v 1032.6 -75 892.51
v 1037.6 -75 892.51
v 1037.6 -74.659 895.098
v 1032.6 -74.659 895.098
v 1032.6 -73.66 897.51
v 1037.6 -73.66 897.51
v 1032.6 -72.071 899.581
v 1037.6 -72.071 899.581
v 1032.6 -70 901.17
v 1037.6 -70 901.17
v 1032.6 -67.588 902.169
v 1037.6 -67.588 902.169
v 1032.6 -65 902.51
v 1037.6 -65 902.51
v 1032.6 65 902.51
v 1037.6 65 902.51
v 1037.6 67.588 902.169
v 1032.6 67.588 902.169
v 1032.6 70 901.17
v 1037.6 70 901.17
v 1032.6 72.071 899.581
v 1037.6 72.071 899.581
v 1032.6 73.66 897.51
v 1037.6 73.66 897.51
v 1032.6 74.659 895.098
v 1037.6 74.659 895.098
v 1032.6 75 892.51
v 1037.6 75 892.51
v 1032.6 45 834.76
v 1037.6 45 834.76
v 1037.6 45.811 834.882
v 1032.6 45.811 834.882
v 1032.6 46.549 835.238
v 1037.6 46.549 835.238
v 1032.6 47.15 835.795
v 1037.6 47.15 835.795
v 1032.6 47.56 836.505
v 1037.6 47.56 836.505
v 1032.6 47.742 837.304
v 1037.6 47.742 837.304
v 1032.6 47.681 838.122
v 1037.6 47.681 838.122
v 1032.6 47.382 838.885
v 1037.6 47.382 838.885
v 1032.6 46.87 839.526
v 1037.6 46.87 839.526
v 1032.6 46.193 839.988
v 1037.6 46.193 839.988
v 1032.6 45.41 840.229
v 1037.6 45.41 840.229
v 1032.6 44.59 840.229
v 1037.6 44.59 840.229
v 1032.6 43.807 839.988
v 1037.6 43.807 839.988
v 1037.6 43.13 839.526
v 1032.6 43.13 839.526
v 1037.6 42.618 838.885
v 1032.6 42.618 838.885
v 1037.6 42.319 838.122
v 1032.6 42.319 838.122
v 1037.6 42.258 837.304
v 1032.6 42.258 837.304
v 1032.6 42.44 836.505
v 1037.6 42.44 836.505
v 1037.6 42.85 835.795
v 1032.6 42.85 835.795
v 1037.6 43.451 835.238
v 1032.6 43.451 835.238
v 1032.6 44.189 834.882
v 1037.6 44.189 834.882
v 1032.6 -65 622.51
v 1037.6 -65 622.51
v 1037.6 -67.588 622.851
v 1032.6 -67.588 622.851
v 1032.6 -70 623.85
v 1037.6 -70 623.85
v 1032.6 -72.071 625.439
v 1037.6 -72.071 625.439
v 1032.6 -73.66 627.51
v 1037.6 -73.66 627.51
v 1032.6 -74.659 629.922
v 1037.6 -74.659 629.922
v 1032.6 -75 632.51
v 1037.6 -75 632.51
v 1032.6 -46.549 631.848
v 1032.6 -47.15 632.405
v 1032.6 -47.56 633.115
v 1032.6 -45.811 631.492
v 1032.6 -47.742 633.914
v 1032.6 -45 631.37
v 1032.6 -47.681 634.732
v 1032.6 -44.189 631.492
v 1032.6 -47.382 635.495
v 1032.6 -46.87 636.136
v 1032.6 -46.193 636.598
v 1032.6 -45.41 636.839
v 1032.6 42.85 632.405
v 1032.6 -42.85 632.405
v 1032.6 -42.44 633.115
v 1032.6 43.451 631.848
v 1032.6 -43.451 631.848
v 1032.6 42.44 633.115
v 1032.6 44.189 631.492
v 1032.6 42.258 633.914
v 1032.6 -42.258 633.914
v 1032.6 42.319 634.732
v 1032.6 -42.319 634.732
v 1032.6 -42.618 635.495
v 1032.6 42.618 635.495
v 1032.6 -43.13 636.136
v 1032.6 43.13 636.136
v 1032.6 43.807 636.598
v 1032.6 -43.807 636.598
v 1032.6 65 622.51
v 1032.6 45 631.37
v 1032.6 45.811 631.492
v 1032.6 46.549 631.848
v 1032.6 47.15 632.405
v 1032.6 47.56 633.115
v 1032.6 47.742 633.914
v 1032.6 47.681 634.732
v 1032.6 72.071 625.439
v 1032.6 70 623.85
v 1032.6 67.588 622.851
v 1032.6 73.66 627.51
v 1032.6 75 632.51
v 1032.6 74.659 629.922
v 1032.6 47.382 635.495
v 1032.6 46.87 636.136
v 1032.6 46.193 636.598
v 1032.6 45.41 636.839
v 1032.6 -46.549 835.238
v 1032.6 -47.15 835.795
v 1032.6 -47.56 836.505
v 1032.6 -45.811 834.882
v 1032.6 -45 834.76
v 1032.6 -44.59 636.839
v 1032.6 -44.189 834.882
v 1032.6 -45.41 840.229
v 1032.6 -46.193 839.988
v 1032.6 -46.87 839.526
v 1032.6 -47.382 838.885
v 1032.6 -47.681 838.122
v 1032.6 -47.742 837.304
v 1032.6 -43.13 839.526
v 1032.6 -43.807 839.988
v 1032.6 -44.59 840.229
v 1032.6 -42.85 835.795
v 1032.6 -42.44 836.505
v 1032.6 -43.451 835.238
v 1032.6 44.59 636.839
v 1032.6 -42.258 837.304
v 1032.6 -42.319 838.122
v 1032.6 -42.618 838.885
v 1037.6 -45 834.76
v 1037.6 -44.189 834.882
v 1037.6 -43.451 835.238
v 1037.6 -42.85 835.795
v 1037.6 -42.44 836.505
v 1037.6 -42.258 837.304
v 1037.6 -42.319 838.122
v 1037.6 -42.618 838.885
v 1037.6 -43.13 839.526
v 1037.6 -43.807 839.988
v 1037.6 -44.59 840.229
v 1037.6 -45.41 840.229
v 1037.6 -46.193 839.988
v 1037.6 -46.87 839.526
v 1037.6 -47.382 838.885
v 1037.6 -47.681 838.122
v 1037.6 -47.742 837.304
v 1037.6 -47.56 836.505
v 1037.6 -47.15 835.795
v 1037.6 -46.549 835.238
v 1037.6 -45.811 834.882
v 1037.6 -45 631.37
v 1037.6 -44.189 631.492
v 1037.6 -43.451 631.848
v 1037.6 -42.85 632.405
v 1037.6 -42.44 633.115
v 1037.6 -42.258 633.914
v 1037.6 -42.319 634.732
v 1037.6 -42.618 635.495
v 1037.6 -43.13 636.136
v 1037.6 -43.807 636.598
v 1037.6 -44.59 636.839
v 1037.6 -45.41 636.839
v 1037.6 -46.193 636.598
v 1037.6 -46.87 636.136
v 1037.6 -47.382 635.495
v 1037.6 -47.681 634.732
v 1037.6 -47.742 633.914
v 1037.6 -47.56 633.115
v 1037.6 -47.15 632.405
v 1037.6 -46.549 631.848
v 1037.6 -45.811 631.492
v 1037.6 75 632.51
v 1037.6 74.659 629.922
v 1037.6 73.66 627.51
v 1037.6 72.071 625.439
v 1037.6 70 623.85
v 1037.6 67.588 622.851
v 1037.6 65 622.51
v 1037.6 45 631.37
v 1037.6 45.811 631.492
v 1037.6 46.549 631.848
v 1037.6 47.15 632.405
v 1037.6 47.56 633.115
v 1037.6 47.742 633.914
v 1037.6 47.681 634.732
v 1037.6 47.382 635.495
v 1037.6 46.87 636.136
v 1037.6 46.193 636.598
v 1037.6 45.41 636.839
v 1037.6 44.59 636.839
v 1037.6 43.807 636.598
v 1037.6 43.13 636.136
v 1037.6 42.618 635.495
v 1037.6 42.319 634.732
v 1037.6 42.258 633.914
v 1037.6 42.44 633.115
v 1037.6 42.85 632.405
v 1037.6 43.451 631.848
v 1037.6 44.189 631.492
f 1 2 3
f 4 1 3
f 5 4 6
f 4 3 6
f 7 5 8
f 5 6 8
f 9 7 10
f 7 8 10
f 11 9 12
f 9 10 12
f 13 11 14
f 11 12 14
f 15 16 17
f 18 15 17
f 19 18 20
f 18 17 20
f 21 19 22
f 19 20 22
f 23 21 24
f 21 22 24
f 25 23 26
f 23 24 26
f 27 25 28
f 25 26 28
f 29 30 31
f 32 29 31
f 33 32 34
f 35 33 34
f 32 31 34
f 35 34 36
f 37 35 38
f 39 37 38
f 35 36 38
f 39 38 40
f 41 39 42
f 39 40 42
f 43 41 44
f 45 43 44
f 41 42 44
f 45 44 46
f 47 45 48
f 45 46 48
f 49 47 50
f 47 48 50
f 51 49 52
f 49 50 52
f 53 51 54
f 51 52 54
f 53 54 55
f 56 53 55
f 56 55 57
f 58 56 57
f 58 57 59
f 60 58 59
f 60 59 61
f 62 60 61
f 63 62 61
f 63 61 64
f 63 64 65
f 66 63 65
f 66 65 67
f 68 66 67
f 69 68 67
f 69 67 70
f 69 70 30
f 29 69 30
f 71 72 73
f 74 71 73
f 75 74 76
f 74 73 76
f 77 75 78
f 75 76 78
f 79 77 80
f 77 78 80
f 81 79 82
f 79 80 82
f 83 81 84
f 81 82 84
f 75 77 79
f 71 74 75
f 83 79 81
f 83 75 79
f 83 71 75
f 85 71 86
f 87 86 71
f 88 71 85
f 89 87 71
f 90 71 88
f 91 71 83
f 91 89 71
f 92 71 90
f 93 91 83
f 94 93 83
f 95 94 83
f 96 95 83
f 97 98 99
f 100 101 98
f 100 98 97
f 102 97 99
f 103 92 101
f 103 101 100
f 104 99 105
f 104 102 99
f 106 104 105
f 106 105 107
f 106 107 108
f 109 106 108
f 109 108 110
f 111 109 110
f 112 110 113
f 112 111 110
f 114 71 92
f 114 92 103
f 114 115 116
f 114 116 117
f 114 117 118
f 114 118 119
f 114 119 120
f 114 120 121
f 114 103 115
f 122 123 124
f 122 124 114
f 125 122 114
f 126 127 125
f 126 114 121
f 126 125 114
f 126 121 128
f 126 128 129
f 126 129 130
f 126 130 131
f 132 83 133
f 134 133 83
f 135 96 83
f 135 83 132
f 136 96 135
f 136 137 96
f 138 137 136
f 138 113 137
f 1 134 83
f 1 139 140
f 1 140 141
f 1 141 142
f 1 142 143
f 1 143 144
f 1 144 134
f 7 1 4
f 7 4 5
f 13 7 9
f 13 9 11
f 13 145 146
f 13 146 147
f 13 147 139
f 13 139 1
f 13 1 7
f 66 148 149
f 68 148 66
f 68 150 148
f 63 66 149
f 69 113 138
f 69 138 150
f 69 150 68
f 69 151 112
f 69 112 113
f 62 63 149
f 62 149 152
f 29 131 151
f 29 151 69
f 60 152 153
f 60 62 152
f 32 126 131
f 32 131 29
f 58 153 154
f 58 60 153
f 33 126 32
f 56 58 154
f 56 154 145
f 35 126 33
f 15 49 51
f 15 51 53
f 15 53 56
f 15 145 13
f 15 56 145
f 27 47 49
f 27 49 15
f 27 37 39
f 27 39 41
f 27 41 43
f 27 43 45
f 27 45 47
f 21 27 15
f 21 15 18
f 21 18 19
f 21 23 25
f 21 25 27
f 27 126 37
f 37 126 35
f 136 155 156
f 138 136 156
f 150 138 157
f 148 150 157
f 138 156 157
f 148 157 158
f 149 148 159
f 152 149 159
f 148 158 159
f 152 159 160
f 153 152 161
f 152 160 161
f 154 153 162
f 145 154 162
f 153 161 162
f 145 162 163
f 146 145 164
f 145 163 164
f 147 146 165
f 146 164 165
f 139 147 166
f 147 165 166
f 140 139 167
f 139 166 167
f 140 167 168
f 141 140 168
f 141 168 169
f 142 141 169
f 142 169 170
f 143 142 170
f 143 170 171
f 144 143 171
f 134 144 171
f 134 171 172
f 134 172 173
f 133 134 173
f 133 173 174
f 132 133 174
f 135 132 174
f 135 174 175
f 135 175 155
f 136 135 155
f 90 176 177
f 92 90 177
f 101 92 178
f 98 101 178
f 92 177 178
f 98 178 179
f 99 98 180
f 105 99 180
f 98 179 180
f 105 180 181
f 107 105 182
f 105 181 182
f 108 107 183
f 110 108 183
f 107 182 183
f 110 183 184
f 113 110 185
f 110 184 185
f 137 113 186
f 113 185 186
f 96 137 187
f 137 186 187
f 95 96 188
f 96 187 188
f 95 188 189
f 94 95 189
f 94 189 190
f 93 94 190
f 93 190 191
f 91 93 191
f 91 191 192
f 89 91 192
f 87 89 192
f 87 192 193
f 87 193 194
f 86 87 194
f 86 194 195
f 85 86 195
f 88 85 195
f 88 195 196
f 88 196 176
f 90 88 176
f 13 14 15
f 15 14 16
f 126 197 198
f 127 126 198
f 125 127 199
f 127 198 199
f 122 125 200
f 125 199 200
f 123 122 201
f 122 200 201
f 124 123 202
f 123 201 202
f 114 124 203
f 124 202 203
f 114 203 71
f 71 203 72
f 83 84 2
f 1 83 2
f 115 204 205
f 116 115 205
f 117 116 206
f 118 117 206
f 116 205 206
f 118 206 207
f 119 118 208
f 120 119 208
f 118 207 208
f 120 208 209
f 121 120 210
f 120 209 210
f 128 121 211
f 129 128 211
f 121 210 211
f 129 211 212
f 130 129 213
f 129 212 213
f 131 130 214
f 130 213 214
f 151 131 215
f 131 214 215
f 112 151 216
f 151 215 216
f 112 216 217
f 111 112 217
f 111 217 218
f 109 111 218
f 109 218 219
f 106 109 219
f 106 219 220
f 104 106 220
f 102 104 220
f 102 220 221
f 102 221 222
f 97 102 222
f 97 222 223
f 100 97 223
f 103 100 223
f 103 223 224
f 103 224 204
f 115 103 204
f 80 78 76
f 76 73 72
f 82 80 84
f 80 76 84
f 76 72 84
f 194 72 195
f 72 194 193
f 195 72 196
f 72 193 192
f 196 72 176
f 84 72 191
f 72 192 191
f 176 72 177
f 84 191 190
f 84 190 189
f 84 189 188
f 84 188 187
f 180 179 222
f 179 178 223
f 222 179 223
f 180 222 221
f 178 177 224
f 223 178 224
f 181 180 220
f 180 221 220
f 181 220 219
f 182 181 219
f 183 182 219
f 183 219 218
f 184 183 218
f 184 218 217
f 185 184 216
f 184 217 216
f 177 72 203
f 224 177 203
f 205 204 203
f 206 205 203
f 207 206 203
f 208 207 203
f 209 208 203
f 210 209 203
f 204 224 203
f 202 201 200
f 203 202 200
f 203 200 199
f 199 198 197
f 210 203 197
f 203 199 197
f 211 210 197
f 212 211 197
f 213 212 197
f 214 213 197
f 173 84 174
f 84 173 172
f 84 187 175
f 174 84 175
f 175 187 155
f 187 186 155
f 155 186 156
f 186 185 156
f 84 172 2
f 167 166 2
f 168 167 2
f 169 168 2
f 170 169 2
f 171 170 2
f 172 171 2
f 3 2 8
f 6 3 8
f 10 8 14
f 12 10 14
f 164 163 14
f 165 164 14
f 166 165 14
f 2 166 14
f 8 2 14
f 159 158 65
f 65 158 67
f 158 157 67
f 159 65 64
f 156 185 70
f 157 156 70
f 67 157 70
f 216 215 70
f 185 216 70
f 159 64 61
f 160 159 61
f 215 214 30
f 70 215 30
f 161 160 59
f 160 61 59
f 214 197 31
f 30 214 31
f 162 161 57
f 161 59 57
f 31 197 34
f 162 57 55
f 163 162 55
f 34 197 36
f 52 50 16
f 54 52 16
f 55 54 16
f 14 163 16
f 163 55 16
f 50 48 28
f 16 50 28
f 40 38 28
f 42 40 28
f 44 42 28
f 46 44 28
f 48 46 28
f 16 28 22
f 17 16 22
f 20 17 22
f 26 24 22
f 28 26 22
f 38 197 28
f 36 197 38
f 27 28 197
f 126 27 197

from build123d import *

# Parameters (mm, degrees)
DODANIE_WYCI_GNI_CIE1_DEPTH = 5
OTW_R_POD_RUB_M51_D         = 5.5
OTW_R_POD_RUB_M51_DEPTH     = 14
OTW_R_POD_RUB_M51_TIP       = 1.652366702
OTW_R_POD_RUB_M52_D         = 5.5
OTW_R_POD_RUB_M52_DEPTH     = 14
OTW_R_POD_RUB_M52_TIP       = 1.652366702


with BuildPart() as part:
    # Szkic1 → Dodanie-wyciągnięcie1 (new body)
    with BuildSketch(Plane(origin=(1037.6, 0, 0), x_dir=(0, 0, -1), z_dir=(1, 0, 0))):
        with BuildLine():
            Line((-892.51, 75), (-632.51, 75))
            ThreePointArc((-632.51, 75), (-625.438932188, 72.071067812), (-622.51, 65))
            Line((-622.51, 65), (-622.51, -65))
            ThreePointArc((-622.51, -65), (-625.438932188, -72.071067812), (-632.51, -75))
            Line((-632.51, -75), (-892.51, -75))
            ThreePointArc((-892.51, -75), (-899.581067812, -72.071067812), (-902.51, -65))
            Line((-902.51, -65), (-902.51, 65))
            ThreePointArc((-902.51, 65), (-899.581067812, 72.071067812), (-892.51, 75))
        make_face()
    extrude(amount=-DODANIE_WYCI_GNI_CIE1_DEPTH)

    # Otwór pod śrubę M51
    with Locations(Plane.ZY.offset(-1032.6)):
        with Locations((634.12, 45), (634.12, -45)):
            Hole(OTW_R_POD_RUB_M51_D / 2, depth=OTW_R_POD_RUB_M51_DEPTH)
            with Locations((0, 0, -(OTW_R_POD_RUB_M51_DEPTH + OTW_R_POD_RUB_M51_TIP / 2))):  # 118° drill point
                Cone(0, OTW_R_POD_RUB_M51_D / 2, OTW_R_POD_RUB_M51_TIP, mode=Mode.SUBTRACT)

    # Otwór pod śrubę M52
    with Locations(Plane.ZY.offset(-1032.6)):
        with Locations((837.51, 45), (837.51, -45)):
            Hole(OTW_R_POD_RUB_M52_D / 2, depth=OTW_R_POD_RUB_M52_DEPTH)
            with Locations((0, 0, -(OTW_R_POD_RUB_M52_DEPTH + OTW_R_POD_RUB_M52_TIP / 2))):  # 118° drill point
                Cone(0, OTW_R_POD_RUB_M52_D / 2, OTW_R_POD_RUB_M52_TIP, mode=Mode.SUBTRACT)


solid = part.part
